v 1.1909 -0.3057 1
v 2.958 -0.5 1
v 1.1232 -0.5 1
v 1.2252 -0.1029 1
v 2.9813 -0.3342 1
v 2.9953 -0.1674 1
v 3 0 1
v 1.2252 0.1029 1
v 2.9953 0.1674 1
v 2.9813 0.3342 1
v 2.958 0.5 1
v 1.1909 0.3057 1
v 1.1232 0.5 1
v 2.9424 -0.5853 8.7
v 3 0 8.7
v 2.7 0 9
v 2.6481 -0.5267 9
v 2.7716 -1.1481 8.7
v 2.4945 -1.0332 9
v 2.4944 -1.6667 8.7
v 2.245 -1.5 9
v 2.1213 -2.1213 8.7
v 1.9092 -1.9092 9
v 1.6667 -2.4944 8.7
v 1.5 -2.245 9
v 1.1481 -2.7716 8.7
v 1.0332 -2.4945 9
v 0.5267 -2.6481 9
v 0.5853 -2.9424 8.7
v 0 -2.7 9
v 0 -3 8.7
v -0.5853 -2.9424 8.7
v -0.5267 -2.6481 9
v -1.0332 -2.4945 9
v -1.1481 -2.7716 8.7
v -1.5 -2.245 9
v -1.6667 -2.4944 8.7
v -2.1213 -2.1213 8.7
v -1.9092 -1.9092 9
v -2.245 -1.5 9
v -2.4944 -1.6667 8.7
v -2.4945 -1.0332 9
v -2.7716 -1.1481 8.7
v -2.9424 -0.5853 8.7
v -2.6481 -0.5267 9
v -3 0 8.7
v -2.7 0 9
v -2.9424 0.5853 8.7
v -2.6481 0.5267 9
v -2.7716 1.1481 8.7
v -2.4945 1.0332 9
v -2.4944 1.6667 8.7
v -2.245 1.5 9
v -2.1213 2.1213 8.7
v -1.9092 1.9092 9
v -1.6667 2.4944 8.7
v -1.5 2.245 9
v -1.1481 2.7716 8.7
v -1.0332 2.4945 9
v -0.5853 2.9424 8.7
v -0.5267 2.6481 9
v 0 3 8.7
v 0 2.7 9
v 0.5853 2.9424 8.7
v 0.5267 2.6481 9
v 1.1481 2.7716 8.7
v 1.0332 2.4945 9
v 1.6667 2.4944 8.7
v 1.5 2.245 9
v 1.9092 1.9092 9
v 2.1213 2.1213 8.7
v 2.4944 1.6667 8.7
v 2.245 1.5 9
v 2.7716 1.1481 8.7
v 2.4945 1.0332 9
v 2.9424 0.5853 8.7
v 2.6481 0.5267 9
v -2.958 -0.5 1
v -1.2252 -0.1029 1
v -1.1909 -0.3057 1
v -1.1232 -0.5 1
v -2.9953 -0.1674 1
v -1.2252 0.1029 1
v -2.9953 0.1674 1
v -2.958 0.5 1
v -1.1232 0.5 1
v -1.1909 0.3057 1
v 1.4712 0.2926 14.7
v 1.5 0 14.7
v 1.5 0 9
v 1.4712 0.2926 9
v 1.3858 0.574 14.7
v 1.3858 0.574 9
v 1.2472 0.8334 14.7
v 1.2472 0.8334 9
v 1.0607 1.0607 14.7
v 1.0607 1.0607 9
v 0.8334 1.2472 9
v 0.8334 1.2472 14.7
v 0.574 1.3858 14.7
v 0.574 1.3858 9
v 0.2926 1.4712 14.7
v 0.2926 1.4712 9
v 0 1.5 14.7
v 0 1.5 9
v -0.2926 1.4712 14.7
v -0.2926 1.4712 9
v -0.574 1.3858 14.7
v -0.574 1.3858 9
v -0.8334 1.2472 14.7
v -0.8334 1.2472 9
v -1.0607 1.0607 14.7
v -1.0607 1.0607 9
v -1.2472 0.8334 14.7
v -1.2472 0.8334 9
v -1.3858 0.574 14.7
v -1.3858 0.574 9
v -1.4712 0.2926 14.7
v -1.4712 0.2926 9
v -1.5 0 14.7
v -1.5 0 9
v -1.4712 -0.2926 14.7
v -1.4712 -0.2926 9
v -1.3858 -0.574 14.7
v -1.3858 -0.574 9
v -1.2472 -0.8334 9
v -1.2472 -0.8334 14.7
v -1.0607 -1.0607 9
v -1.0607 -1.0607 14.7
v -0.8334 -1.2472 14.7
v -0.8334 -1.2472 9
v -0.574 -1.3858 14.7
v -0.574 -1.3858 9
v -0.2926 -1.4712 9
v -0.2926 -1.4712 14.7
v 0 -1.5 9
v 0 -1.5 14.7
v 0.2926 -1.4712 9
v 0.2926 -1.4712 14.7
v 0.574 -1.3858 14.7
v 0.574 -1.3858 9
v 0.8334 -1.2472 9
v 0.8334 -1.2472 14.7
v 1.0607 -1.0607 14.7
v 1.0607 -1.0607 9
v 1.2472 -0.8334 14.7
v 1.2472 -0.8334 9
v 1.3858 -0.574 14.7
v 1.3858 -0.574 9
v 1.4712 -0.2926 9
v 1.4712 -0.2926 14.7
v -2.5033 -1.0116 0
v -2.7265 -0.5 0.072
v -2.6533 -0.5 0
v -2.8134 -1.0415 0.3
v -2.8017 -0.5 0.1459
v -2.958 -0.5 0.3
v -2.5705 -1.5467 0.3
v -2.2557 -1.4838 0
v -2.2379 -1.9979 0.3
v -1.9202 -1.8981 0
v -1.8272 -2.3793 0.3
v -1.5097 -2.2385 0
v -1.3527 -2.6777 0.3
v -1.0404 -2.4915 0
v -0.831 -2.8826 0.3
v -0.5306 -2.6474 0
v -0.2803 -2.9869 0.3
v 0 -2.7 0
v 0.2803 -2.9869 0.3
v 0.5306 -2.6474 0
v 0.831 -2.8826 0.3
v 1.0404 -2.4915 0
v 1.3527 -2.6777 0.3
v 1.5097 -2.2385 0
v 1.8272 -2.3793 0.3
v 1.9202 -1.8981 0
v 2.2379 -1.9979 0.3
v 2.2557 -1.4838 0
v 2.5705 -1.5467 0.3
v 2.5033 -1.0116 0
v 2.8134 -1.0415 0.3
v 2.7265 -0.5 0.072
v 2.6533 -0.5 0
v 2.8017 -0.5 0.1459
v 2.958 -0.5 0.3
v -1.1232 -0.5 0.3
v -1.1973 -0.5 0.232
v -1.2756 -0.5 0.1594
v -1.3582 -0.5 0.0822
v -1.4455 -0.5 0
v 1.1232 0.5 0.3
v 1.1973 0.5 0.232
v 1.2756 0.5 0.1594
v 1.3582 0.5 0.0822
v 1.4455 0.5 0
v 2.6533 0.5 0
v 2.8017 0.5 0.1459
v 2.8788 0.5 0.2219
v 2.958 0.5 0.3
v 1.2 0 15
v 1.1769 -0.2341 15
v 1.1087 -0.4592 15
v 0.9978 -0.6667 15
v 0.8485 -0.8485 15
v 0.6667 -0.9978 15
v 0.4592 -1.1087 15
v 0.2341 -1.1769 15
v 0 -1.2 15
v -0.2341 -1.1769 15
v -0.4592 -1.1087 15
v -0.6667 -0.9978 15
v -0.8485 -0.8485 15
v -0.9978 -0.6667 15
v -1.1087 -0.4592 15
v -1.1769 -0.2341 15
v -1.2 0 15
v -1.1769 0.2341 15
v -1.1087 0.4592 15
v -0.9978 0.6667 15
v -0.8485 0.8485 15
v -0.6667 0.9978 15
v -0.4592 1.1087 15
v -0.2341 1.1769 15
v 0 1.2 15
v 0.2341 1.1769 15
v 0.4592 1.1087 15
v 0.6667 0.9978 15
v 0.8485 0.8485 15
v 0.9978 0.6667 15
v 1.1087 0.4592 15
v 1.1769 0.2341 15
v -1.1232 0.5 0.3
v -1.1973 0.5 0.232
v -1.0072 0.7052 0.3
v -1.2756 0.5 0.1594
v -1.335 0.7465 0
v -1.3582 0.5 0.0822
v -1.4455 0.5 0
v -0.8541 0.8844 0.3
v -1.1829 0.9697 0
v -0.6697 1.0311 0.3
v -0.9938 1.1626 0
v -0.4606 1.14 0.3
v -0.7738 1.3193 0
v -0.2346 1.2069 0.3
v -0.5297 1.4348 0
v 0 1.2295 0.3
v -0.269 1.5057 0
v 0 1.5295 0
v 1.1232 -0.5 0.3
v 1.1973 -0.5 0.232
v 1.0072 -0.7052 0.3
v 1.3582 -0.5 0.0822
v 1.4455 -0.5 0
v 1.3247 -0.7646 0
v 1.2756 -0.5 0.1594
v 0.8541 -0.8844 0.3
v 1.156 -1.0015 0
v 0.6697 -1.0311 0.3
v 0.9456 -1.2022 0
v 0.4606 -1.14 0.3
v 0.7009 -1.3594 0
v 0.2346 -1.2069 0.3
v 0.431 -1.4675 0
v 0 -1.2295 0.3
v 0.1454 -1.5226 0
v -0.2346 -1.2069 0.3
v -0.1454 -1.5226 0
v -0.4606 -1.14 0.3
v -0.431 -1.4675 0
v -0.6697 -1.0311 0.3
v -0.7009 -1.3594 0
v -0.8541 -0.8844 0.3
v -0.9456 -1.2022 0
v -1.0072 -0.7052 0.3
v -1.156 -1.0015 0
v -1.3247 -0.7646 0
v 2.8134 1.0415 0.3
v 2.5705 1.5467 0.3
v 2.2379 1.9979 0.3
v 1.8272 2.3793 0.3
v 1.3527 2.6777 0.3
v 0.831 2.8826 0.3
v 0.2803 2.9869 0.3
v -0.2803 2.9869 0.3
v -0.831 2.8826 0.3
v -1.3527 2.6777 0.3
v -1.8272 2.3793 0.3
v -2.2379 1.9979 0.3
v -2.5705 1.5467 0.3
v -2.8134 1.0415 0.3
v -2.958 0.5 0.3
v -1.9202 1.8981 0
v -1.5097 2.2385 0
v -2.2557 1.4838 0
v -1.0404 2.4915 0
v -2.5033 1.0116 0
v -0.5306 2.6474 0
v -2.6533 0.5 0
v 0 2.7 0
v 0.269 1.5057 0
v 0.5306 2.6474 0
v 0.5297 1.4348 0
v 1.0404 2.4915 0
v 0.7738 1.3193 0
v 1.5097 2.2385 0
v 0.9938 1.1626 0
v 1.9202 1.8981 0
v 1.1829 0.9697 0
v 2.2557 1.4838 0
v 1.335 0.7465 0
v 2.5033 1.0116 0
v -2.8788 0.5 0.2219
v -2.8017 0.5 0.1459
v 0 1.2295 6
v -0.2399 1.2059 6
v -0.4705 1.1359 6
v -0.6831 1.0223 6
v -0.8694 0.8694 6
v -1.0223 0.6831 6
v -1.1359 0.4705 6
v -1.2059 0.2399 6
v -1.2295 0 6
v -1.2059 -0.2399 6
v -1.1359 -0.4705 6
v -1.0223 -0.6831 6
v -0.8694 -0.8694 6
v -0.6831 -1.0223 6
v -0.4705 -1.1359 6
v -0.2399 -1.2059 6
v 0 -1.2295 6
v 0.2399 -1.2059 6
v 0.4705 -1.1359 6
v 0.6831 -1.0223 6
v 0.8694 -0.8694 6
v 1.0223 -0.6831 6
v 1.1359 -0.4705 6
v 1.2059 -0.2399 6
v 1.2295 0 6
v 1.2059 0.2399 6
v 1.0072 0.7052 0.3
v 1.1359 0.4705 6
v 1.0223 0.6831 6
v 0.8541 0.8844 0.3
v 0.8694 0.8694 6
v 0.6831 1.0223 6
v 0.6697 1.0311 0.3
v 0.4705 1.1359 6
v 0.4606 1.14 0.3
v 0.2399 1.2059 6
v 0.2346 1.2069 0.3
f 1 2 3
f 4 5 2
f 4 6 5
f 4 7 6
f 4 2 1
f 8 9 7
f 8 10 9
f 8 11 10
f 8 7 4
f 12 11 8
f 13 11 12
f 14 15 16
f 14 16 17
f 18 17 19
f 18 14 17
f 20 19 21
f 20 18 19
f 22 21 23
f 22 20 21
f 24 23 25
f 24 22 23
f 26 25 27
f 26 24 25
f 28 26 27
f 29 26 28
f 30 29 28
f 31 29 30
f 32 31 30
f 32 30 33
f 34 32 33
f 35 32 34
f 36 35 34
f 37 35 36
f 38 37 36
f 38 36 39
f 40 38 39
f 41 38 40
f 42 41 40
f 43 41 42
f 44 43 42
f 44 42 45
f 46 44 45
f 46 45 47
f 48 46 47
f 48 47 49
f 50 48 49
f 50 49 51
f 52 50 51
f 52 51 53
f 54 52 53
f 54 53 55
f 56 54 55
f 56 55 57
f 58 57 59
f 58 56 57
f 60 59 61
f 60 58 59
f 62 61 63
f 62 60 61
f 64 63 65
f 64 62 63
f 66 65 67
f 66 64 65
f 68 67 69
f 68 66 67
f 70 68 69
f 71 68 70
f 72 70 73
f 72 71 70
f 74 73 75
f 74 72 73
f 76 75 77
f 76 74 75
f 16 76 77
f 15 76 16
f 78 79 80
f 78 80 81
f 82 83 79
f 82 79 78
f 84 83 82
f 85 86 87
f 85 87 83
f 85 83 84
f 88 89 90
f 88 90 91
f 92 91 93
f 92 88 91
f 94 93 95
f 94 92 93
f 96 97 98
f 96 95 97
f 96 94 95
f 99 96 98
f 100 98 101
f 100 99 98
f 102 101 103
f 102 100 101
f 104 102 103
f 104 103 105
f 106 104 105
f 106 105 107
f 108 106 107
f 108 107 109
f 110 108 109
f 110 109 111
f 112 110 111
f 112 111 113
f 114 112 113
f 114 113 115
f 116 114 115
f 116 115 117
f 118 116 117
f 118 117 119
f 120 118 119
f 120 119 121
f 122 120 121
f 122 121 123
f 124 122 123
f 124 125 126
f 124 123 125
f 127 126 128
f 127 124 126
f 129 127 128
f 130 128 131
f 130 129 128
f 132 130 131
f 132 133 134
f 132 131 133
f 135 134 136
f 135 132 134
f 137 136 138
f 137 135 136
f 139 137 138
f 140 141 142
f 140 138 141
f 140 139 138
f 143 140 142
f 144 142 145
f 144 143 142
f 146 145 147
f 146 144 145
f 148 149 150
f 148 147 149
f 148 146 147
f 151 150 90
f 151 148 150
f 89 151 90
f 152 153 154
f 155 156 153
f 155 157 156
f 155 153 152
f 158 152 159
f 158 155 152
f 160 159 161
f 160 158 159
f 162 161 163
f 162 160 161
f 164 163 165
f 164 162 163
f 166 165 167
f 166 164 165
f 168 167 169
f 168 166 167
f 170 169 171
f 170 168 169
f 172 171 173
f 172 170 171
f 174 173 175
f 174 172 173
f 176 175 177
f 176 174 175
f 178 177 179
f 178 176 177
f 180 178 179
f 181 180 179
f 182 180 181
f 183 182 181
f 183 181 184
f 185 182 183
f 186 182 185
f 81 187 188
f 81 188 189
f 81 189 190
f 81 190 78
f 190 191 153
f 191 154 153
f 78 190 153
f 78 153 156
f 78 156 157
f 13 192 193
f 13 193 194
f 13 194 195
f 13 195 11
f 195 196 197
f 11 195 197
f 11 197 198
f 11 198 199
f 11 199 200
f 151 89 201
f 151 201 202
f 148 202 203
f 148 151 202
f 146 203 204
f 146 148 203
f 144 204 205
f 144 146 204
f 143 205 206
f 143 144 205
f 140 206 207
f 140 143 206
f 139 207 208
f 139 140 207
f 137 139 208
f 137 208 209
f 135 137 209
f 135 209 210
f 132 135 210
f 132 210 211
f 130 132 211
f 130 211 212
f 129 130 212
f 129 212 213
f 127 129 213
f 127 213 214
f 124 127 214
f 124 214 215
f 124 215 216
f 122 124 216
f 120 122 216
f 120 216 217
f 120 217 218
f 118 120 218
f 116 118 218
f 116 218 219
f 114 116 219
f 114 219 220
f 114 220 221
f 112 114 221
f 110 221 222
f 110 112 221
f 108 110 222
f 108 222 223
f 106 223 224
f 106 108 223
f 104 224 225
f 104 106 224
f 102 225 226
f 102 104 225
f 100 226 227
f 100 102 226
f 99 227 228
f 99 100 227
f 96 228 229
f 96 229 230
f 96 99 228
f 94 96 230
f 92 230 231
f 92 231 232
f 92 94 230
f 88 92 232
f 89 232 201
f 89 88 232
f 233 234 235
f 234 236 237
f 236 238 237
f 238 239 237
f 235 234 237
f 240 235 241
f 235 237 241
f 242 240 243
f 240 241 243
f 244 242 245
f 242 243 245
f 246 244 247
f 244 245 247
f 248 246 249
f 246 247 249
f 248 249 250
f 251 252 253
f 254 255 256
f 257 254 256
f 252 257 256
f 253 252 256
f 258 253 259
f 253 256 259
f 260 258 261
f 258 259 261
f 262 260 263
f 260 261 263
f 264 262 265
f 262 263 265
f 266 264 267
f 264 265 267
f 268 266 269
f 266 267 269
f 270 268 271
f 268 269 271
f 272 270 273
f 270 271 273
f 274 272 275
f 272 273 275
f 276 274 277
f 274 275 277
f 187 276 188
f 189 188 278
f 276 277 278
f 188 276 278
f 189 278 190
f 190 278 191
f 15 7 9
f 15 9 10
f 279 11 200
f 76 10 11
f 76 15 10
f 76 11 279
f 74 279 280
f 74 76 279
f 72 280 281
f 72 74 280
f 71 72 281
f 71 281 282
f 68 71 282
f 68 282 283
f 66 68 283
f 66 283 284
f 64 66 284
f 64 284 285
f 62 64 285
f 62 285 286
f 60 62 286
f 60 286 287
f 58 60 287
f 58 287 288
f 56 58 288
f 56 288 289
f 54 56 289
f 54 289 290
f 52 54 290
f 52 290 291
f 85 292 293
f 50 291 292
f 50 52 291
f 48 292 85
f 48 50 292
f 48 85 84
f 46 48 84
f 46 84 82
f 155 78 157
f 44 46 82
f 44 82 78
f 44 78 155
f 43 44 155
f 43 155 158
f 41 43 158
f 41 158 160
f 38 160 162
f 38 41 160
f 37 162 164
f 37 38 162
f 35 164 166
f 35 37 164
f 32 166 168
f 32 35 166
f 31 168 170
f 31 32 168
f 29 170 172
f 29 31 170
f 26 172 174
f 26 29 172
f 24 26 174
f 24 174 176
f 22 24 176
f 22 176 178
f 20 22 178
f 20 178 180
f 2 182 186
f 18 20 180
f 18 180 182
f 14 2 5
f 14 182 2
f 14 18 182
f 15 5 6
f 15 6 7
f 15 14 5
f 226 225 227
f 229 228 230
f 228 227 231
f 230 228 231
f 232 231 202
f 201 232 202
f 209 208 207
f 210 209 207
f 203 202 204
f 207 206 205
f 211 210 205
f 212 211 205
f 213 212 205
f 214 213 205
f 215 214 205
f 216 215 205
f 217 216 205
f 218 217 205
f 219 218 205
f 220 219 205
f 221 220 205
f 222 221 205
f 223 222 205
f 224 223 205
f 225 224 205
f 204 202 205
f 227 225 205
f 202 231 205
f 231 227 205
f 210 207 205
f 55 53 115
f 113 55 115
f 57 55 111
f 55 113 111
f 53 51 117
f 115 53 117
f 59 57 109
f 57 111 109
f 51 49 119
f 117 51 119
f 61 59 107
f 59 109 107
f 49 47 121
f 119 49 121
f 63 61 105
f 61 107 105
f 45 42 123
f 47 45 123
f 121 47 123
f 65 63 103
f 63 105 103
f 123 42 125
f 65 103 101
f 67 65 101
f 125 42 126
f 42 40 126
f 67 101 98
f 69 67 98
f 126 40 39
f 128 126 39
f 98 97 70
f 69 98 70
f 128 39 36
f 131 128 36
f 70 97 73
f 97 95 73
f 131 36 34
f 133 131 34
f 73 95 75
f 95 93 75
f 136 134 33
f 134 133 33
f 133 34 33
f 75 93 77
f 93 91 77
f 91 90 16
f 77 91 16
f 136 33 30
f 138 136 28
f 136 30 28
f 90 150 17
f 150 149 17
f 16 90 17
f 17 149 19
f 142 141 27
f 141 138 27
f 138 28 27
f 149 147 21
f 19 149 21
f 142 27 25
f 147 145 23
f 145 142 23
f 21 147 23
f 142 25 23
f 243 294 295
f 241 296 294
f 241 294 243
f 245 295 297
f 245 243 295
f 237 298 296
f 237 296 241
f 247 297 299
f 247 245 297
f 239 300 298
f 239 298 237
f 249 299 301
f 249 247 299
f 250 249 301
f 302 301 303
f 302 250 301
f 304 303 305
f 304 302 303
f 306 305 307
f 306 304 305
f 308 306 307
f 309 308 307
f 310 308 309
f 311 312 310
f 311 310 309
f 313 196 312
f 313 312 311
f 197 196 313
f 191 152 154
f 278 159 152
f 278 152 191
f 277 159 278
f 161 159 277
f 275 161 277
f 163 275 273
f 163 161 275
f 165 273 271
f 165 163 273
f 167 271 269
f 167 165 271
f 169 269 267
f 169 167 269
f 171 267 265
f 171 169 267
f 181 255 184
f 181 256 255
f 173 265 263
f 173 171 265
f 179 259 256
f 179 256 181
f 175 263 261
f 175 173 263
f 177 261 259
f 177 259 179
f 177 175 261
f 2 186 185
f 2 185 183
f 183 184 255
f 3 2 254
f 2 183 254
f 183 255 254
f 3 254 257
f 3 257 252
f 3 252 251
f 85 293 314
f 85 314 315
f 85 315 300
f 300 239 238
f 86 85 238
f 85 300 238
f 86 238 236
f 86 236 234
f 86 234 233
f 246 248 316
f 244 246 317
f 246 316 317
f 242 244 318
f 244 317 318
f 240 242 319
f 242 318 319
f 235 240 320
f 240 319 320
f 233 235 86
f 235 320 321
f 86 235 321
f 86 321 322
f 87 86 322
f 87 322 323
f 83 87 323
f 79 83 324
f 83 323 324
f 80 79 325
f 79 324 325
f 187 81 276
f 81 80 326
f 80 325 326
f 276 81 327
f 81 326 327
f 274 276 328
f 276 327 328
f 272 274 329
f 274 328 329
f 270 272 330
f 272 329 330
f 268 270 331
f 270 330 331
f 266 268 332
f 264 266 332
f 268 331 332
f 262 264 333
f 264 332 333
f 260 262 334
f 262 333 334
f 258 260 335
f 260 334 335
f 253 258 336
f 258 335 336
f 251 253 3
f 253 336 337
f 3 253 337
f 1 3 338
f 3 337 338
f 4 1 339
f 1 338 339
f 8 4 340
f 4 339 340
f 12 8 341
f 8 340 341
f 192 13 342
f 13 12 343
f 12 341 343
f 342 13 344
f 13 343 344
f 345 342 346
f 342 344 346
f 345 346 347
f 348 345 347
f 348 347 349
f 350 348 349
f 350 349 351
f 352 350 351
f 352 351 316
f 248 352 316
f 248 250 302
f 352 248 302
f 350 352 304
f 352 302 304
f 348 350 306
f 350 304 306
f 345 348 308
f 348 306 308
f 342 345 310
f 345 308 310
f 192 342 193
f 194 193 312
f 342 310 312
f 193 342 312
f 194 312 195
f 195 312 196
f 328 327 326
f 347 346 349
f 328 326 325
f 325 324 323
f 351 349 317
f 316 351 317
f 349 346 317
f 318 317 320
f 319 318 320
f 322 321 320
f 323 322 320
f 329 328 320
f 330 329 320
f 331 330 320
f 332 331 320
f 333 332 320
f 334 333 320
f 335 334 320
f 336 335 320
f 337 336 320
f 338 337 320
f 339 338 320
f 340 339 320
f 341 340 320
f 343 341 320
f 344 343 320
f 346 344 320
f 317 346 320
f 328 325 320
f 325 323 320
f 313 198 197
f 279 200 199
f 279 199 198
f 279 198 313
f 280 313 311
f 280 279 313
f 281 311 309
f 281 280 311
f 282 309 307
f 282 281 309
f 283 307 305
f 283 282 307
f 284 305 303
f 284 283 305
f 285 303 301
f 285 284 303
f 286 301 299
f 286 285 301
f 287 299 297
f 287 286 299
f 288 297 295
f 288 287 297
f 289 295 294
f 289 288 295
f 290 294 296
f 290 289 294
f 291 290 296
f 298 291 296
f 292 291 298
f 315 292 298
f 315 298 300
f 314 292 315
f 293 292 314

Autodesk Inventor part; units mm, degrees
ref_plane "YZ Plane" through (0, 0, 0) normal (1, 0, 0) x (0, 1, 0)
ref_plane "XZ Plane" through (0, 0, 0) normal (0, 1, 0) x (-1, 0, 0)
ref_plane "XY Plane" through (0, 0, 0) normal (0, 0, 1) x (1, 0, 0)
sketch "Sketch1" plane through (0, 0, 0) normal (0, 1, 0) x (-1, 0, 0)
  line L0 (0, 0) -> (-3, 0)
  line L1 (-3, 0) -> (-3, 9)
  line L2 (-3, 9) -> (-1.5, 9)
  line L3 (-1.5, 9) -> (-1.5, 15)
  line L4 (-1.5, 15) -> (0, 15)
  line L5 (0, 15) -> (0, 0)
  dimension "d1" = 6
  dimension "d2" = 9
  dimension "d3" = 3
  dimension "d4" = 6
revolve "Revolution1" add sketch "Sketch1" angle 360 about axis through (0, 0, 15) along (0, 0, -1)
sketch "Sketch2" plane through (0, 0, 0) normal (0, 0, -1) x (-1, 0, 0)
  line L0 (-3, -0.5) -> (3, -0.5)
  line L1 (3, -0.5) -> (3, 0.5)
  line L2 (3, 0.5) -> (-3, 0.5)
  line L3 (-3, 0.5) -> (-3, -0.5)
  line L4 (-3, -0.5) -> (3, 0.5) construction
  line L5 (3, -0.5) -> (-3, 0.5) construction
  circle A0 centre (0, 0) radius 3 projected
  dimension "d6" = 1
extrude "Extrusion1" cut sketch "Sketch2" against normal blind 1 contours L3 A0 L0 | A0 L2 L0 | L3 L2 A0 | A0 L1 L0 | A0 L2 L1
hole "Hole1" at (0, 0, 0) direction (0, 0, 1) diameter 2.459 depth 6 thread size "M3x0.5" class "6H" standard "ANSI Metric M Profile"
thread "Thread1" size "M3x0.5" class "6g" standard "ANSI Metric M Profile" full length
chamfer "Chamfer1" distance 0.3 angle 45 7 edges at (-3, 0, 9) (0, 3, 0) (0, -3, 0) (0, -1.2295, 0) (-0.6697, 1.0311, 0) (0.6697, 1.0311, 0) (-1.5, 0, 15)
properties part number "BRU-309S" material "Stainless Steel AISI 304"
